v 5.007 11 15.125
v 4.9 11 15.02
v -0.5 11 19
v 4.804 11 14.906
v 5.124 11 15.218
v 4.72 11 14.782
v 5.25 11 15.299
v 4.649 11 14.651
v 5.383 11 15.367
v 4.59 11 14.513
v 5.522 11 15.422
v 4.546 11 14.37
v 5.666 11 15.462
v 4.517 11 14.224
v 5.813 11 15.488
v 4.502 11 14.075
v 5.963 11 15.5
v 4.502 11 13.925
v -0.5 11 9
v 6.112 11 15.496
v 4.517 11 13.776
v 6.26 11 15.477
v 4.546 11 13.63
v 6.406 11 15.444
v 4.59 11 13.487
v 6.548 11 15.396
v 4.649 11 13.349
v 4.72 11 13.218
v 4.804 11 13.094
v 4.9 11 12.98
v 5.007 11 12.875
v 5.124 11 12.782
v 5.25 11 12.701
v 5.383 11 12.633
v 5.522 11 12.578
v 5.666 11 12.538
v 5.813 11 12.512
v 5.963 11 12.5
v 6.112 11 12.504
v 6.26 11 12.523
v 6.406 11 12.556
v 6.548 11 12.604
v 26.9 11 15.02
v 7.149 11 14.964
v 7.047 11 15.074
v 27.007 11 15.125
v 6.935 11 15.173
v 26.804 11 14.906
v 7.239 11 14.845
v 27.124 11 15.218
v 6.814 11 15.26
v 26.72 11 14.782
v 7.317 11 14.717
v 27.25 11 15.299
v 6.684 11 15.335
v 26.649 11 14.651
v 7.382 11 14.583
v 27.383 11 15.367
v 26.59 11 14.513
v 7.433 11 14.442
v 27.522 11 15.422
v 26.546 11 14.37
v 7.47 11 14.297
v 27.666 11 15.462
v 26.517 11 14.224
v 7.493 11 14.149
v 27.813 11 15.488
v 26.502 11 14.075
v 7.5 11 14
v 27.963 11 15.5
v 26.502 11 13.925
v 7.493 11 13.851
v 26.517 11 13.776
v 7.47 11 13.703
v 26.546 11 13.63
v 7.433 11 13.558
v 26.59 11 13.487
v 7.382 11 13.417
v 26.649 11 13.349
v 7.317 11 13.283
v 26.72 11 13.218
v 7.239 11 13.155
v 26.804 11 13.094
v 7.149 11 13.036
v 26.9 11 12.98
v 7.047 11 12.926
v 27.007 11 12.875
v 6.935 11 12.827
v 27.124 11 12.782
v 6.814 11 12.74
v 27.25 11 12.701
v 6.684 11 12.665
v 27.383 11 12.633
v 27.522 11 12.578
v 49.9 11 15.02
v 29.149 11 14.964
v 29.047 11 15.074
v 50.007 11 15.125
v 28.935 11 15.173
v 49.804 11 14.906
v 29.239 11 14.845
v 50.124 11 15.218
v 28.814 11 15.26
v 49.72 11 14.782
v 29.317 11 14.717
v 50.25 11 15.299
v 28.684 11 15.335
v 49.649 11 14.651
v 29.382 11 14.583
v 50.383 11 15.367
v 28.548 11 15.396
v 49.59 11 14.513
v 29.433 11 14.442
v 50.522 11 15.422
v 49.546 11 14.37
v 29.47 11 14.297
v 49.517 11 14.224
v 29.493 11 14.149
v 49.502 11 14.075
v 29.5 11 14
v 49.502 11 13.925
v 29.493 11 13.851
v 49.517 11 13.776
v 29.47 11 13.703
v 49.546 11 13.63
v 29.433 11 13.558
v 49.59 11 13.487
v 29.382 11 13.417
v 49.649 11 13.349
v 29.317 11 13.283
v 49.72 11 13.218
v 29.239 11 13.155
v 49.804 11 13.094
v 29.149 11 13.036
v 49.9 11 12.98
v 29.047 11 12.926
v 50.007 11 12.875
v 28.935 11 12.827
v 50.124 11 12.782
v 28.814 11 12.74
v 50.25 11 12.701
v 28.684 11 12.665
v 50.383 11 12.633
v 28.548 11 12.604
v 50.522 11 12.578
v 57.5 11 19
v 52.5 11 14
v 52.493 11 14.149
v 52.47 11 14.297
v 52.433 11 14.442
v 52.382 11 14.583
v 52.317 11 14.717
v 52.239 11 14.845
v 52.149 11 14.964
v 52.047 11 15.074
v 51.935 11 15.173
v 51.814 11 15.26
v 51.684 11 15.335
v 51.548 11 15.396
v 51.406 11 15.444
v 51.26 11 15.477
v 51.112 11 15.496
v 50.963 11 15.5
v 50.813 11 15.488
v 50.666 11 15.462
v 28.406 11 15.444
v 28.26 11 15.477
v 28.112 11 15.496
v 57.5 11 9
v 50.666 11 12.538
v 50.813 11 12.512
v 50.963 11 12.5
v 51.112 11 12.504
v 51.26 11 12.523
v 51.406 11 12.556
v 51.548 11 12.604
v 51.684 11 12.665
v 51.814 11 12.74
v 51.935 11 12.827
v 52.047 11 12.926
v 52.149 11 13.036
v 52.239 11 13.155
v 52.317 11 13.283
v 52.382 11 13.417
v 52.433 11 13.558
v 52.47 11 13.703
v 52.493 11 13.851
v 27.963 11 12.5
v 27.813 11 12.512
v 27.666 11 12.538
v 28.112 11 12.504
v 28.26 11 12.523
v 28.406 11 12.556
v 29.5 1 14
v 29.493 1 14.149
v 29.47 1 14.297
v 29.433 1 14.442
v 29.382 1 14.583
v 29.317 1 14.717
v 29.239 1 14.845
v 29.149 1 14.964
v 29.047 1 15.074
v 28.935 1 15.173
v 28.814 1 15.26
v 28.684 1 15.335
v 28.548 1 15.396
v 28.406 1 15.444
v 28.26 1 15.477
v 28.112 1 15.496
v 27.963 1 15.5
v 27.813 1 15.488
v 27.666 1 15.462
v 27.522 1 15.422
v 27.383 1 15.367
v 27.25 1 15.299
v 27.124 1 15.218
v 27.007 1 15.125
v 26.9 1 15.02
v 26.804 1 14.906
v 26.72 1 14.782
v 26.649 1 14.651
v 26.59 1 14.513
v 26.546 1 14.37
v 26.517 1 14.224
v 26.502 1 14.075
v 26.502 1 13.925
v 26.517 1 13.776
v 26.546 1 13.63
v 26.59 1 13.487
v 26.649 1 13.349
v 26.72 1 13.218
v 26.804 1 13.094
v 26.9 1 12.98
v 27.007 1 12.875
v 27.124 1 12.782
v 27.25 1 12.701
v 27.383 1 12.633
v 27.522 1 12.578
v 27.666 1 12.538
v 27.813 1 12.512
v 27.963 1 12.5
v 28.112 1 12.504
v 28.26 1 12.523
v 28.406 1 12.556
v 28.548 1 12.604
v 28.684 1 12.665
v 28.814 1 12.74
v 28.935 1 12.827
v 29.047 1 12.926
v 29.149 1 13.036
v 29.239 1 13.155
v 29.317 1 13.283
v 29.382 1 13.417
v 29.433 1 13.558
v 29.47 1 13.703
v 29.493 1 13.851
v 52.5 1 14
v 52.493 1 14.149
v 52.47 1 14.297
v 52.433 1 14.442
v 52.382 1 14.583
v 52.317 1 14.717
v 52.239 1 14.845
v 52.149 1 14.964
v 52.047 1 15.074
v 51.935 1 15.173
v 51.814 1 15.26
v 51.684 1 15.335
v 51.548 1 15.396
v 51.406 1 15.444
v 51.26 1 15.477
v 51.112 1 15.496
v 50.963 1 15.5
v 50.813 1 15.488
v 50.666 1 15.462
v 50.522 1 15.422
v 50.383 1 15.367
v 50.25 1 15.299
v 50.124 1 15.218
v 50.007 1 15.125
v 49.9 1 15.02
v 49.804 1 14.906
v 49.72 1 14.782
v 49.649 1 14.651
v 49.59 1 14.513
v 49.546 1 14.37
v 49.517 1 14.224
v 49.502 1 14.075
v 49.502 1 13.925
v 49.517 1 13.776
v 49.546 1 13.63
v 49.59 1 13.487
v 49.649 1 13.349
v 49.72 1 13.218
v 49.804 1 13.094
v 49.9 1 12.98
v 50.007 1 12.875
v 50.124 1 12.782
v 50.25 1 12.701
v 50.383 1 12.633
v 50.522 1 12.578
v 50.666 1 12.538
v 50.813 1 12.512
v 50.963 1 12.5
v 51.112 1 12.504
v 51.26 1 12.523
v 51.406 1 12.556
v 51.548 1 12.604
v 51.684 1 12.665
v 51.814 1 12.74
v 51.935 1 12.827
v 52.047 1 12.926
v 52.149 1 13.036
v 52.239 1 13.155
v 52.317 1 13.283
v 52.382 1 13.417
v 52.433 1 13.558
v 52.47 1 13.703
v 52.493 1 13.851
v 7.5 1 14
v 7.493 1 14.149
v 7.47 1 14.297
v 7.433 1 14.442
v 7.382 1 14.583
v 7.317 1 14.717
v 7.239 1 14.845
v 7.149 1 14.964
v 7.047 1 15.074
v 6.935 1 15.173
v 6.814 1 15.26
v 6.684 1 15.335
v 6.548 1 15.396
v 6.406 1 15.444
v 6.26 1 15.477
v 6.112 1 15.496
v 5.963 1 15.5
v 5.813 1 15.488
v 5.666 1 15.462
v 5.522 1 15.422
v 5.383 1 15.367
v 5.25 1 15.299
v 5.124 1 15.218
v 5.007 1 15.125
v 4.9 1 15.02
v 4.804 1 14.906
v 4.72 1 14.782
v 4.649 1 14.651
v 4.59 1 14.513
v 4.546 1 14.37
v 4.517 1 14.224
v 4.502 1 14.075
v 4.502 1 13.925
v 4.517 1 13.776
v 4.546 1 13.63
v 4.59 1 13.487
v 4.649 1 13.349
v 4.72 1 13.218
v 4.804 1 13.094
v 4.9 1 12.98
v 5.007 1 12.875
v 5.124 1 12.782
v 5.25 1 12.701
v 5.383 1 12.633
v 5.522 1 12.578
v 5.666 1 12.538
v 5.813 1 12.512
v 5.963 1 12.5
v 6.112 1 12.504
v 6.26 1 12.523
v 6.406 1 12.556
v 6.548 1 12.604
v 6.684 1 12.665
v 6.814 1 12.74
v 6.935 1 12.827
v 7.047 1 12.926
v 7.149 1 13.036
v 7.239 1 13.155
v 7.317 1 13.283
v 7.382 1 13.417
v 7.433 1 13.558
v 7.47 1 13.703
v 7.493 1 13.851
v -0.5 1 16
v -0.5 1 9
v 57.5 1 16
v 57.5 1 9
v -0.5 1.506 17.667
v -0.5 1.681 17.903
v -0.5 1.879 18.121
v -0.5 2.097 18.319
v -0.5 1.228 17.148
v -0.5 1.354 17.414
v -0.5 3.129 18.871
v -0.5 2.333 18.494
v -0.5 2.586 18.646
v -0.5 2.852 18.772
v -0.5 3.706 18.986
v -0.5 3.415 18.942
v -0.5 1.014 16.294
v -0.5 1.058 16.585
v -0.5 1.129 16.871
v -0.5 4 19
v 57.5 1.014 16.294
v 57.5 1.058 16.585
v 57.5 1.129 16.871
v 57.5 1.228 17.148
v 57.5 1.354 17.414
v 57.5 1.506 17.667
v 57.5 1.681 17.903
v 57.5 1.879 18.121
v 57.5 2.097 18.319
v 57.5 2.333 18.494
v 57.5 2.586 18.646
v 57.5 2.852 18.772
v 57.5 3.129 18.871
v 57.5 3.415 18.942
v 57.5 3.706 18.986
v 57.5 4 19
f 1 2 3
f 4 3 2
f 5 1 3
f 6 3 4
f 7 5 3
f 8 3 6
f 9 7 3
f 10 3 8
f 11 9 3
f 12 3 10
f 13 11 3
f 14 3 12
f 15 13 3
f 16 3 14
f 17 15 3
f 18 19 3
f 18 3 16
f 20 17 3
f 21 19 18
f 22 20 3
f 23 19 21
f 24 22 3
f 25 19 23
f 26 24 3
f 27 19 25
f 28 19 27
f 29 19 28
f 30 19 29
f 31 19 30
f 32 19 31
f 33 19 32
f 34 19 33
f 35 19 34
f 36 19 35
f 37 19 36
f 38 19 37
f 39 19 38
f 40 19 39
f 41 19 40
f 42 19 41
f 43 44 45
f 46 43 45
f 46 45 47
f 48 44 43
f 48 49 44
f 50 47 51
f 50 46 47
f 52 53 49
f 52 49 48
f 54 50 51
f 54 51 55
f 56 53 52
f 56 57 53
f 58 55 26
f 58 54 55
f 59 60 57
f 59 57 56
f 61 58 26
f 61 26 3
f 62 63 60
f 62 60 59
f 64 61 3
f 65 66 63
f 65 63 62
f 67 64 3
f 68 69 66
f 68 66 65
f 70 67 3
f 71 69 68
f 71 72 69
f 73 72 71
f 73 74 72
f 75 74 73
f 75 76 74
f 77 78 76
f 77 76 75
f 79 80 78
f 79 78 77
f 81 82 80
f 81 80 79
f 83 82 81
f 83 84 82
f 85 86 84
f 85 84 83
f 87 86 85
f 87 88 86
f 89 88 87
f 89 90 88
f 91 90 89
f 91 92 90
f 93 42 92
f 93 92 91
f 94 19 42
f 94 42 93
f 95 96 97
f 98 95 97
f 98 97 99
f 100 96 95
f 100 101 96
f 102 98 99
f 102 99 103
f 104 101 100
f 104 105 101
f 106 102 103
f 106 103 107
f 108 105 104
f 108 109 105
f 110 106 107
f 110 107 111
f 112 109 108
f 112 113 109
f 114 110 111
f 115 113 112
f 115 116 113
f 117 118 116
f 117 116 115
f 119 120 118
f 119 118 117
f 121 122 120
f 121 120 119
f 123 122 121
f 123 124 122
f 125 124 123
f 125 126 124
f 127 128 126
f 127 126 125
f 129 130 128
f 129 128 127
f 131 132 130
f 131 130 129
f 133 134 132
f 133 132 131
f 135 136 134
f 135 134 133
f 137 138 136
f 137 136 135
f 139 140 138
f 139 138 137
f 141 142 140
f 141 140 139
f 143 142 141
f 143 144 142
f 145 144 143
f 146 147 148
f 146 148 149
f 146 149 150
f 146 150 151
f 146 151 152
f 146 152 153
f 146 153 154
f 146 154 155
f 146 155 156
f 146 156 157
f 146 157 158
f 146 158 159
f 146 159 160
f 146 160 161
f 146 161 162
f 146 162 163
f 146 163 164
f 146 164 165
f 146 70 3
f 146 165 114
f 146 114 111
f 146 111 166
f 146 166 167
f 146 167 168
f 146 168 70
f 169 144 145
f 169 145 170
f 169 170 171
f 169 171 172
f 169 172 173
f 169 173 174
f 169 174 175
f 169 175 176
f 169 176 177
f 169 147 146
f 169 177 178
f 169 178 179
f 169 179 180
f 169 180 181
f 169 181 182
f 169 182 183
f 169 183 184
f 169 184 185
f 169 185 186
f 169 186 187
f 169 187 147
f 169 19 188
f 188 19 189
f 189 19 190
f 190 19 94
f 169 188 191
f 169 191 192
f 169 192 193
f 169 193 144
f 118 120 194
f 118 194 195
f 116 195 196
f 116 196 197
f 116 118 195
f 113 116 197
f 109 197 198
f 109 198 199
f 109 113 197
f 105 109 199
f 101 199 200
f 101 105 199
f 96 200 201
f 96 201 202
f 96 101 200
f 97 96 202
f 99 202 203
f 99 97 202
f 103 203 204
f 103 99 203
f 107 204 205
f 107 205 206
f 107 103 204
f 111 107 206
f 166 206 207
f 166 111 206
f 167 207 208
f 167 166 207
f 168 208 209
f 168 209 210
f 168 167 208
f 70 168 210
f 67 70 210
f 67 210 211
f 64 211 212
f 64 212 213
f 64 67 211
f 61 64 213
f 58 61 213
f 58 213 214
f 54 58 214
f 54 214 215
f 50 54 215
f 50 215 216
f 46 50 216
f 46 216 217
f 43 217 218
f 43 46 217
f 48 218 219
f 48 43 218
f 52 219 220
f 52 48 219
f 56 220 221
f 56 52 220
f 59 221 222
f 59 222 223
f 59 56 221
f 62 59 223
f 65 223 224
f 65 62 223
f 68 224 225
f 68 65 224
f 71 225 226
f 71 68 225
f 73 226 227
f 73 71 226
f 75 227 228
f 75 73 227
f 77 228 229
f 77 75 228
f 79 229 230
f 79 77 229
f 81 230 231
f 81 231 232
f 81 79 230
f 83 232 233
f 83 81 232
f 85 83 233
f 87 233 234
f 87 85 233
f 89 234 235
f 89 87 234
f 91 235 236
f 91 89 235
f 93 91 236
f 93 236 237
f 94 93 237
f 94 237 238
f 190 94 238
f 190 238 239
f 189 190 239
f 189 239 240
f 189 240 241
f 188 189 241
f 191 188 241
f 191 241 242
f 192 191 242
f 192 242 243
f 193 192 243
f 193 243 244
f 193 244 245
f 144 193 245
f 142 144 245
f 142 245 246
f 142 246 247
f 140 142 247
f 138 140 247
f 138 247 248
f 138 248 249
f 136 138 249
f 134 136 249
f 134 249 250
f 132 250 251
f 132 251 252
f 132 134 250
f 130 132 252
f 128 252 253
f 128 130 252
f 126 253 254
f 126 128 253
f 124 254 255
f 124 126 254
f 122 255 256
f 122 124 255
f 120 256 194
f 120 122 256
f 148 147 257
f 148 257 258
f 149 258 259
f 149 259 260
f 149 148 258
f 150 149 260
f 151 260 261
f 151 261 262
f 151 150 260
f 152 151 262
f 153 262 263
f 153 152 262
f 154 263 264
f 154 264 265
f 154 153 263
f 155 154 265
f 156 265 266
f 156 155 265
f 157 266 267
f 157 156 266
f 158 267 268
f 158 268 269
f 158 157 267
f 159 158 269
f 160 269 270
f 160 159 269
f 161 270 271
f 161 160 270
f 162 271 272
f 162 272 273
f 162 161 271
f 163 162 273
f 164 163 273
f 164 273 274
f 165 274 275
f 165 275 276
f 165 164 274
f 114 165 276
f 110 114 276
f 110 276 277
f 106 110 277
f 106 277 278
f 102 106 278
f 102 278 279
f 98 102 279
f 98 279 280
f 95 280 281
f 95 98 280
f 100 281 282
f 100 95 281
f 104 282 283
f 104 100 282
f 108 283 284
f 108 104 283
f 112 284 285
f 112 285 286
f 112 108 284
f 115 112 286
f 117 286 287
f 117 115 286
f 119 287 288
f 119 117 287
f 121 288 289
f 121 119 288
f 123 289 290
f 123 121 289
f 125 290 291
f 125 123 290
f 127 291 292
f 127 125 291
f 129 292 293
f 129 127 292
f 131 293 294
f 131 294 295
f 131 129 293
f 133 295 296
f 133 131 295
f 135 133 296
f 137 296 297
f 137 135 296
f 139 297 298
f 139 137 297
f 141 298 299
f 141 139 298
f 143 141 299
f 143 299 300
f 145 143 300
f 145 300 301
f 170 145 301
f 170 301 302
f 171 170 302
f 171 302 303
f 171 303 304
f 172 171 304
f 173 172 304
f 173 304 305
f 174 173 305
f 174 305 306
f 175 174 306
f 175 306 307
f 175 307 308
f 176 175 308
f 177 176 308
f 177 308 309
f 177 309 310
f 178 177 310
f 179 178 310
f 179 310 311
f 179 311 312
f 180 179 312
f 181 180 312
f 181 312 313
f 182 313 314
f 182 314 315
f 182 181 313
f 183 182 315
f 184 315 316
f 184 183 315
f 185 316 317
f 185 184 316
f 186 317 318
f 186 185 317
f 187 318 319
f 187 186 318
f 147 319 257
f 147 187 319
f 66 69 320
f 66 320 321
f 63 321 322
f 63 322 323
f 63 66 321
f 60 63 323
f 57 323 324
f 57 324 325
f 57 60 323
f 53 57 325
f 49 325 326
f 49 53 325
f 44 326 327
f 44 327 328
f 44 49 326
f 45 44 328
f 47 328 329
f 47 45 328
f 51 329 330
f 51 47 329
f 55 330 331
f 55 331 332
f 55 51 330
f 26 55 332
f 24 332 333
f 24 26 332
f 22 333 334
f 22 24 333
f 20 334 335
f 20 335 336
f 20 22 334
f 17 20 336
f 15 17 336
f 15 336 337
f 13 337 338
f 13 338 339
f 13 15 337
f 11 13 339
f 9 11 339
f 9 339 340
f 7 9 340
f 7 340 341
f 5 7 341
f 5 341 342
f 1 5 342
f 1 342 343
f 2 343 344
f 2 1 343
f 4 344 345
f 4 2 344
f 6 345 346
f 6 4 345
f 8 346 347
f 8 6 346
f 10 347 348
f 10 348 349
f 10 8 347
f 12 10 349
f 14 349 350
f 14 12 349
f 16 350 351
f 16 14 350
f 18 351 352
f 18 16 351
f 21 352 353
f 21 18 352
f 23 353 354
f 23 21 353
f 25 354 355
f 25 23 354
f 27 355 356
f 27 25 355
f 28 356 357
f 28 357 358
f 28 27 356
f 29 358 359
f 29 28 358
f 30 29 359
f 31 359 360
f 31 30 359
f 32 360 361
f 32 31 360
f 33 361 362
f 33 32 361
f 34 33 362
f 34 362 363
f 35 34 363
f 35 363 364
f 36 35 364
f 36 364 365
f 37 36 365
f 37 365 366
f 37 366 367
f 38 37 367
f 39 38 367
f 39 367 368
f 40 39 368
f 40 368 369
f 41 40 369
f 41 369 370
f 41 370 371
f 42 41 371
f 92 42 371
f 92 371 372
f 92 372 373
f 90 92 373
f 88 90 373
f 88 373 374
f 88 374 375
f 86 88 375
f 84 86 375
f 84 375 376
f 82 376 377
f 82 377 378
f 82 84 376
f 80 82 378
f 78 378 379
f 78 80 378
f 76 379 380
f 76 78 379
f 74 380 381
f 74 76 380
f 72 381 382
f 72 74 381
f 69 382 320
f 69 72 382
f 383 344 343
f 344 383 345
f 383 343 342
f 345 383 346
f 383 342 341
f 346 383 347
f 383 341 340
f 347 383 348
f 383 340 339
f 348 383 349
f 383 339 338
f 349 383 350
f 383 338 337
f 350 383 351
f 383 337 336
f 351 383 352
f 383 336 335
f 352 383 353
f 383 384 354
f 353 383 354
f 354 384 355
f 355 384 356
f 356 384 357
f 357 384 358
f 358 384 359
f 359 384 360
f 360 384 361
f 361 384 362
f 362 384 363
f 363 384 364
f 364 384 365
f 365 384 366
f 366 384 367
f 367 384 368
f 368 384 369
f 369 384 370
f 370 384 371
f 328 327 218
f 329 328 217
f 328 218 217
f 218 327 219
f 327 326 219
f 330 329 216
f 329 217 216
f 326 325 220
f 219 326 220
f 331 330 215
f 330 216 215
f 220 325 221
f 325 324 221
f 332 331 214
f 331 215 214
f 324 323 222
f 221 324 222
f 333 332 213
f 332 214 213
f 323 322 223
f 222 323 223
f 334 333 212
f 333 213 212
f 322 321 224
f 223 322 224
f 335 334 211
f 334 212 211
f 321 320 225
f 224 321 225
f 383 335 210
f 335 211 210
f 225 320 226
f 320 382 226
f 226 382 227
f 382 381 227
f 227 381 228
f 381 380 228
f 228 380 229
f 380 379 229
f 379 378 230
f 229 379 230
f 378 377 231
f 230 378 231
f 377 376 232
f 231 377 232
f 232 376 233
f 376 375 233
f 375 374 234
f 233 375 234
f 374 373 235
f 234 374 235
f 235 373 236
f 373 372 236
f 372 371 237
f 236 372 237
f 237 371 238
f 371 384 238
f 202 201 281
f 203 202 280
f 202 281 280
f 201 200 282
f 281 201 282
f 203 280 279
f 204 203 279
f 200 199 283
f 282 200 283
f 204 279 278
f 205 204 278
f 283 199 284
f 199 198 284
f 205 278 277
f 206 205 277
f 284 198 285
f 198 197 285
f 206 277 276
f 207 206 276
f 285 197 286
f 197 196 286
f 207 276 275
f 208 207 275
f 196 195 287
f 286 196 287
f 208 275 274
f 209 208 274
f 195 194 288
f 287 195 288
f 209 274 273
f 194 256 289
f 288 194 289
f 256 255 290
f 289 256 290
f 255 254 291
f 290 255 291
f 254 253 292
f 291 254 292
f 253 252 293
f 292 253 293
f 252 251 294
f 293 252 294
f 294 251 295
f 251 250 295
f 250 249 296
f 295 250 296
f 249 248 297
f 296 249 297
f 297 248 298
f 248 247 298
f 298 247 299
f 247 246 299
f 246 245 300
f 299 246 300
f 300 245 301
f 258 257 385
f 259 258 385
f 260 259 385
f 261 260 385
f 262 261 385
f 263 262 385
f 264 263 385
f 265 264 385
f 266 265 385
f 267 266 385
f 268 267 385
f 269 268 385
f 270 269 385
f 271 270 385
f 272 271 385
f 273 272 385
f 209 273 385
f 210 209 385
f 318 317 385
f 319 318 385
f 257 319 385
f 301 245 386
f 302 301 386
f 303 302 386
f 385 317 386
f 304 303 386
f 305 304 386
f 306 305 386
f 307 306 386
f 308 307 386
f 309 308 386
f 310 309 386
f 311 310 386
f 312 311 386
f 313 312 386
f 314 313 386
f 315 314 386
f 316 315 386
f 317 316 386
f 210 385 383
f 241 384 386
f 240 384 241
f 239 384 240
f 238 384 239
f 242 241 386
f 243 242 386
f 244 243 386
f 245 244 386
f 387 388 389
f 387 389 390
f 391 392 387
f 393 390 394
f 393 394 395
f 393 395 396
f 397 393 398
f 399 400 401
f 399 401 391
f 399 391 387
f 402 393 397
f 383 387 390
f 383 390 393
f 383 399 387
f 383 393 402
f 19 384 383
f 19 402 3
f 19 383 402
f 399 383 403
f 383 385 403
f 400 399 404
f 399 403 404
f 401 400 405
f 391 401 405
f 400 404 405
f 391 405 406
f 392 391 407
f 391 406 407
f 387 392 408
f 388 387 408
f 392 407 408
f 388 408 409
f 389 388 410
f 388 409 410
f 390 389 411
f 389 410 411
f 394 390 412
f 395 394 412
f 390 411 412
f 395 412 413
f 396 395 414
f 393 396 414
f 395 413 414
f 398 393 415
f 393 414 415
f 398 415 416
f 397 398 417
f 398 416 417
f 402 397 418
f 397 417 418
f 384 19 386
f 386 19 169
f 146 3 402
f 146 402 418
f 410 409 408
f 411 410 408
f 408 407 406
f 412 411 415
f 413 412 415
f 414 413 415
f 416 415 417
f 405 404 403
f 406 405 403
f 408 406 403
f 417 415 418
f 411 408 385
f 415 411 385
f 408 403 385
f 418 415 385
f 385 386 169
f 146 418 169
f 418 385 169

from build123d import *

# Parameters (mm, degrees)
CYLINDER043_R     = 1.5
CYLINDER043_DEPTH = 10
CYLINDER044_R     = 1.5
CYLINDER044_DEPTH = 10
CYLINDER042_R     = 1.5
CYLINDER042_DEPTH = 10
BOX020_W          = 58
BOX020_H          = 10
BOX020_DEPTH      = 10
FILLET009_R       = 3


with BuildPart() as cylinder043:
    # Cylinder043 → Cylinder043 (new body)
    with BuildSketch(Plane(origin=(28, 11, 14), x_dir=(1, 0, 0), z_dir=(0, -1, 0))):
        Circle(CYLINDER043_R)
    extrude(amount=CYLINDER043_DEPTH)


with BuildPart() as cylinder044:
    # Cylinder044 → Cylinder044 (new body)
    with BuildSketch(Plane(origin=(51, 11, 14), x_dir=(1, 0, 0), z_dir=(0, -1, 0))):
        Circle(CYLINDER044_R)
    extrude(amount=CYLINDER044_DEPTH)


with BuildPart() as fusion033:
    # Cylinder042 → Cylinder042 (new body)
    with BuildSketch(Plane(origin=(6, 11, 14), x_dir=(1, 0, 0), z_dir=(0, -1, 0))):
        Circle(CYLINDER042_R)
    extrude(amount=CYLINDER042_DEPTH)

    # Fusion033: union Cylinder043, Cylinder044
    add(cylinder043.part)
    add(cylinder044.part)


with BuildPart() as frame_holes001:
    # Box020 → Box020 (new body)
    with BuildSketch(Plane.XY.offset(9)):
        with Locations((29, 5)):
            Rectangle(BOX020_W, BOX020_H)
    extrude(amount=BOX020_DEPTH)

    # Fillet009
    fillet009_edges = [frame_holes001.edges().sort_by_distance(p)[0] for p in [
        (29, 0, 19),
    ]]
    fillet(fillet009_edges, radius=FILLET009_R)


with BuildPart() as frame_holes001_1:
    # Fillet009 placement: moved
    add(frame_holes001.part.moved(Location((-0.5, 1, 0))))

    # Cut018: cut Fusion033
    add(fusion033.part, mode=Mode.SUBTRACT)


solid = frame_holes001_1.part
